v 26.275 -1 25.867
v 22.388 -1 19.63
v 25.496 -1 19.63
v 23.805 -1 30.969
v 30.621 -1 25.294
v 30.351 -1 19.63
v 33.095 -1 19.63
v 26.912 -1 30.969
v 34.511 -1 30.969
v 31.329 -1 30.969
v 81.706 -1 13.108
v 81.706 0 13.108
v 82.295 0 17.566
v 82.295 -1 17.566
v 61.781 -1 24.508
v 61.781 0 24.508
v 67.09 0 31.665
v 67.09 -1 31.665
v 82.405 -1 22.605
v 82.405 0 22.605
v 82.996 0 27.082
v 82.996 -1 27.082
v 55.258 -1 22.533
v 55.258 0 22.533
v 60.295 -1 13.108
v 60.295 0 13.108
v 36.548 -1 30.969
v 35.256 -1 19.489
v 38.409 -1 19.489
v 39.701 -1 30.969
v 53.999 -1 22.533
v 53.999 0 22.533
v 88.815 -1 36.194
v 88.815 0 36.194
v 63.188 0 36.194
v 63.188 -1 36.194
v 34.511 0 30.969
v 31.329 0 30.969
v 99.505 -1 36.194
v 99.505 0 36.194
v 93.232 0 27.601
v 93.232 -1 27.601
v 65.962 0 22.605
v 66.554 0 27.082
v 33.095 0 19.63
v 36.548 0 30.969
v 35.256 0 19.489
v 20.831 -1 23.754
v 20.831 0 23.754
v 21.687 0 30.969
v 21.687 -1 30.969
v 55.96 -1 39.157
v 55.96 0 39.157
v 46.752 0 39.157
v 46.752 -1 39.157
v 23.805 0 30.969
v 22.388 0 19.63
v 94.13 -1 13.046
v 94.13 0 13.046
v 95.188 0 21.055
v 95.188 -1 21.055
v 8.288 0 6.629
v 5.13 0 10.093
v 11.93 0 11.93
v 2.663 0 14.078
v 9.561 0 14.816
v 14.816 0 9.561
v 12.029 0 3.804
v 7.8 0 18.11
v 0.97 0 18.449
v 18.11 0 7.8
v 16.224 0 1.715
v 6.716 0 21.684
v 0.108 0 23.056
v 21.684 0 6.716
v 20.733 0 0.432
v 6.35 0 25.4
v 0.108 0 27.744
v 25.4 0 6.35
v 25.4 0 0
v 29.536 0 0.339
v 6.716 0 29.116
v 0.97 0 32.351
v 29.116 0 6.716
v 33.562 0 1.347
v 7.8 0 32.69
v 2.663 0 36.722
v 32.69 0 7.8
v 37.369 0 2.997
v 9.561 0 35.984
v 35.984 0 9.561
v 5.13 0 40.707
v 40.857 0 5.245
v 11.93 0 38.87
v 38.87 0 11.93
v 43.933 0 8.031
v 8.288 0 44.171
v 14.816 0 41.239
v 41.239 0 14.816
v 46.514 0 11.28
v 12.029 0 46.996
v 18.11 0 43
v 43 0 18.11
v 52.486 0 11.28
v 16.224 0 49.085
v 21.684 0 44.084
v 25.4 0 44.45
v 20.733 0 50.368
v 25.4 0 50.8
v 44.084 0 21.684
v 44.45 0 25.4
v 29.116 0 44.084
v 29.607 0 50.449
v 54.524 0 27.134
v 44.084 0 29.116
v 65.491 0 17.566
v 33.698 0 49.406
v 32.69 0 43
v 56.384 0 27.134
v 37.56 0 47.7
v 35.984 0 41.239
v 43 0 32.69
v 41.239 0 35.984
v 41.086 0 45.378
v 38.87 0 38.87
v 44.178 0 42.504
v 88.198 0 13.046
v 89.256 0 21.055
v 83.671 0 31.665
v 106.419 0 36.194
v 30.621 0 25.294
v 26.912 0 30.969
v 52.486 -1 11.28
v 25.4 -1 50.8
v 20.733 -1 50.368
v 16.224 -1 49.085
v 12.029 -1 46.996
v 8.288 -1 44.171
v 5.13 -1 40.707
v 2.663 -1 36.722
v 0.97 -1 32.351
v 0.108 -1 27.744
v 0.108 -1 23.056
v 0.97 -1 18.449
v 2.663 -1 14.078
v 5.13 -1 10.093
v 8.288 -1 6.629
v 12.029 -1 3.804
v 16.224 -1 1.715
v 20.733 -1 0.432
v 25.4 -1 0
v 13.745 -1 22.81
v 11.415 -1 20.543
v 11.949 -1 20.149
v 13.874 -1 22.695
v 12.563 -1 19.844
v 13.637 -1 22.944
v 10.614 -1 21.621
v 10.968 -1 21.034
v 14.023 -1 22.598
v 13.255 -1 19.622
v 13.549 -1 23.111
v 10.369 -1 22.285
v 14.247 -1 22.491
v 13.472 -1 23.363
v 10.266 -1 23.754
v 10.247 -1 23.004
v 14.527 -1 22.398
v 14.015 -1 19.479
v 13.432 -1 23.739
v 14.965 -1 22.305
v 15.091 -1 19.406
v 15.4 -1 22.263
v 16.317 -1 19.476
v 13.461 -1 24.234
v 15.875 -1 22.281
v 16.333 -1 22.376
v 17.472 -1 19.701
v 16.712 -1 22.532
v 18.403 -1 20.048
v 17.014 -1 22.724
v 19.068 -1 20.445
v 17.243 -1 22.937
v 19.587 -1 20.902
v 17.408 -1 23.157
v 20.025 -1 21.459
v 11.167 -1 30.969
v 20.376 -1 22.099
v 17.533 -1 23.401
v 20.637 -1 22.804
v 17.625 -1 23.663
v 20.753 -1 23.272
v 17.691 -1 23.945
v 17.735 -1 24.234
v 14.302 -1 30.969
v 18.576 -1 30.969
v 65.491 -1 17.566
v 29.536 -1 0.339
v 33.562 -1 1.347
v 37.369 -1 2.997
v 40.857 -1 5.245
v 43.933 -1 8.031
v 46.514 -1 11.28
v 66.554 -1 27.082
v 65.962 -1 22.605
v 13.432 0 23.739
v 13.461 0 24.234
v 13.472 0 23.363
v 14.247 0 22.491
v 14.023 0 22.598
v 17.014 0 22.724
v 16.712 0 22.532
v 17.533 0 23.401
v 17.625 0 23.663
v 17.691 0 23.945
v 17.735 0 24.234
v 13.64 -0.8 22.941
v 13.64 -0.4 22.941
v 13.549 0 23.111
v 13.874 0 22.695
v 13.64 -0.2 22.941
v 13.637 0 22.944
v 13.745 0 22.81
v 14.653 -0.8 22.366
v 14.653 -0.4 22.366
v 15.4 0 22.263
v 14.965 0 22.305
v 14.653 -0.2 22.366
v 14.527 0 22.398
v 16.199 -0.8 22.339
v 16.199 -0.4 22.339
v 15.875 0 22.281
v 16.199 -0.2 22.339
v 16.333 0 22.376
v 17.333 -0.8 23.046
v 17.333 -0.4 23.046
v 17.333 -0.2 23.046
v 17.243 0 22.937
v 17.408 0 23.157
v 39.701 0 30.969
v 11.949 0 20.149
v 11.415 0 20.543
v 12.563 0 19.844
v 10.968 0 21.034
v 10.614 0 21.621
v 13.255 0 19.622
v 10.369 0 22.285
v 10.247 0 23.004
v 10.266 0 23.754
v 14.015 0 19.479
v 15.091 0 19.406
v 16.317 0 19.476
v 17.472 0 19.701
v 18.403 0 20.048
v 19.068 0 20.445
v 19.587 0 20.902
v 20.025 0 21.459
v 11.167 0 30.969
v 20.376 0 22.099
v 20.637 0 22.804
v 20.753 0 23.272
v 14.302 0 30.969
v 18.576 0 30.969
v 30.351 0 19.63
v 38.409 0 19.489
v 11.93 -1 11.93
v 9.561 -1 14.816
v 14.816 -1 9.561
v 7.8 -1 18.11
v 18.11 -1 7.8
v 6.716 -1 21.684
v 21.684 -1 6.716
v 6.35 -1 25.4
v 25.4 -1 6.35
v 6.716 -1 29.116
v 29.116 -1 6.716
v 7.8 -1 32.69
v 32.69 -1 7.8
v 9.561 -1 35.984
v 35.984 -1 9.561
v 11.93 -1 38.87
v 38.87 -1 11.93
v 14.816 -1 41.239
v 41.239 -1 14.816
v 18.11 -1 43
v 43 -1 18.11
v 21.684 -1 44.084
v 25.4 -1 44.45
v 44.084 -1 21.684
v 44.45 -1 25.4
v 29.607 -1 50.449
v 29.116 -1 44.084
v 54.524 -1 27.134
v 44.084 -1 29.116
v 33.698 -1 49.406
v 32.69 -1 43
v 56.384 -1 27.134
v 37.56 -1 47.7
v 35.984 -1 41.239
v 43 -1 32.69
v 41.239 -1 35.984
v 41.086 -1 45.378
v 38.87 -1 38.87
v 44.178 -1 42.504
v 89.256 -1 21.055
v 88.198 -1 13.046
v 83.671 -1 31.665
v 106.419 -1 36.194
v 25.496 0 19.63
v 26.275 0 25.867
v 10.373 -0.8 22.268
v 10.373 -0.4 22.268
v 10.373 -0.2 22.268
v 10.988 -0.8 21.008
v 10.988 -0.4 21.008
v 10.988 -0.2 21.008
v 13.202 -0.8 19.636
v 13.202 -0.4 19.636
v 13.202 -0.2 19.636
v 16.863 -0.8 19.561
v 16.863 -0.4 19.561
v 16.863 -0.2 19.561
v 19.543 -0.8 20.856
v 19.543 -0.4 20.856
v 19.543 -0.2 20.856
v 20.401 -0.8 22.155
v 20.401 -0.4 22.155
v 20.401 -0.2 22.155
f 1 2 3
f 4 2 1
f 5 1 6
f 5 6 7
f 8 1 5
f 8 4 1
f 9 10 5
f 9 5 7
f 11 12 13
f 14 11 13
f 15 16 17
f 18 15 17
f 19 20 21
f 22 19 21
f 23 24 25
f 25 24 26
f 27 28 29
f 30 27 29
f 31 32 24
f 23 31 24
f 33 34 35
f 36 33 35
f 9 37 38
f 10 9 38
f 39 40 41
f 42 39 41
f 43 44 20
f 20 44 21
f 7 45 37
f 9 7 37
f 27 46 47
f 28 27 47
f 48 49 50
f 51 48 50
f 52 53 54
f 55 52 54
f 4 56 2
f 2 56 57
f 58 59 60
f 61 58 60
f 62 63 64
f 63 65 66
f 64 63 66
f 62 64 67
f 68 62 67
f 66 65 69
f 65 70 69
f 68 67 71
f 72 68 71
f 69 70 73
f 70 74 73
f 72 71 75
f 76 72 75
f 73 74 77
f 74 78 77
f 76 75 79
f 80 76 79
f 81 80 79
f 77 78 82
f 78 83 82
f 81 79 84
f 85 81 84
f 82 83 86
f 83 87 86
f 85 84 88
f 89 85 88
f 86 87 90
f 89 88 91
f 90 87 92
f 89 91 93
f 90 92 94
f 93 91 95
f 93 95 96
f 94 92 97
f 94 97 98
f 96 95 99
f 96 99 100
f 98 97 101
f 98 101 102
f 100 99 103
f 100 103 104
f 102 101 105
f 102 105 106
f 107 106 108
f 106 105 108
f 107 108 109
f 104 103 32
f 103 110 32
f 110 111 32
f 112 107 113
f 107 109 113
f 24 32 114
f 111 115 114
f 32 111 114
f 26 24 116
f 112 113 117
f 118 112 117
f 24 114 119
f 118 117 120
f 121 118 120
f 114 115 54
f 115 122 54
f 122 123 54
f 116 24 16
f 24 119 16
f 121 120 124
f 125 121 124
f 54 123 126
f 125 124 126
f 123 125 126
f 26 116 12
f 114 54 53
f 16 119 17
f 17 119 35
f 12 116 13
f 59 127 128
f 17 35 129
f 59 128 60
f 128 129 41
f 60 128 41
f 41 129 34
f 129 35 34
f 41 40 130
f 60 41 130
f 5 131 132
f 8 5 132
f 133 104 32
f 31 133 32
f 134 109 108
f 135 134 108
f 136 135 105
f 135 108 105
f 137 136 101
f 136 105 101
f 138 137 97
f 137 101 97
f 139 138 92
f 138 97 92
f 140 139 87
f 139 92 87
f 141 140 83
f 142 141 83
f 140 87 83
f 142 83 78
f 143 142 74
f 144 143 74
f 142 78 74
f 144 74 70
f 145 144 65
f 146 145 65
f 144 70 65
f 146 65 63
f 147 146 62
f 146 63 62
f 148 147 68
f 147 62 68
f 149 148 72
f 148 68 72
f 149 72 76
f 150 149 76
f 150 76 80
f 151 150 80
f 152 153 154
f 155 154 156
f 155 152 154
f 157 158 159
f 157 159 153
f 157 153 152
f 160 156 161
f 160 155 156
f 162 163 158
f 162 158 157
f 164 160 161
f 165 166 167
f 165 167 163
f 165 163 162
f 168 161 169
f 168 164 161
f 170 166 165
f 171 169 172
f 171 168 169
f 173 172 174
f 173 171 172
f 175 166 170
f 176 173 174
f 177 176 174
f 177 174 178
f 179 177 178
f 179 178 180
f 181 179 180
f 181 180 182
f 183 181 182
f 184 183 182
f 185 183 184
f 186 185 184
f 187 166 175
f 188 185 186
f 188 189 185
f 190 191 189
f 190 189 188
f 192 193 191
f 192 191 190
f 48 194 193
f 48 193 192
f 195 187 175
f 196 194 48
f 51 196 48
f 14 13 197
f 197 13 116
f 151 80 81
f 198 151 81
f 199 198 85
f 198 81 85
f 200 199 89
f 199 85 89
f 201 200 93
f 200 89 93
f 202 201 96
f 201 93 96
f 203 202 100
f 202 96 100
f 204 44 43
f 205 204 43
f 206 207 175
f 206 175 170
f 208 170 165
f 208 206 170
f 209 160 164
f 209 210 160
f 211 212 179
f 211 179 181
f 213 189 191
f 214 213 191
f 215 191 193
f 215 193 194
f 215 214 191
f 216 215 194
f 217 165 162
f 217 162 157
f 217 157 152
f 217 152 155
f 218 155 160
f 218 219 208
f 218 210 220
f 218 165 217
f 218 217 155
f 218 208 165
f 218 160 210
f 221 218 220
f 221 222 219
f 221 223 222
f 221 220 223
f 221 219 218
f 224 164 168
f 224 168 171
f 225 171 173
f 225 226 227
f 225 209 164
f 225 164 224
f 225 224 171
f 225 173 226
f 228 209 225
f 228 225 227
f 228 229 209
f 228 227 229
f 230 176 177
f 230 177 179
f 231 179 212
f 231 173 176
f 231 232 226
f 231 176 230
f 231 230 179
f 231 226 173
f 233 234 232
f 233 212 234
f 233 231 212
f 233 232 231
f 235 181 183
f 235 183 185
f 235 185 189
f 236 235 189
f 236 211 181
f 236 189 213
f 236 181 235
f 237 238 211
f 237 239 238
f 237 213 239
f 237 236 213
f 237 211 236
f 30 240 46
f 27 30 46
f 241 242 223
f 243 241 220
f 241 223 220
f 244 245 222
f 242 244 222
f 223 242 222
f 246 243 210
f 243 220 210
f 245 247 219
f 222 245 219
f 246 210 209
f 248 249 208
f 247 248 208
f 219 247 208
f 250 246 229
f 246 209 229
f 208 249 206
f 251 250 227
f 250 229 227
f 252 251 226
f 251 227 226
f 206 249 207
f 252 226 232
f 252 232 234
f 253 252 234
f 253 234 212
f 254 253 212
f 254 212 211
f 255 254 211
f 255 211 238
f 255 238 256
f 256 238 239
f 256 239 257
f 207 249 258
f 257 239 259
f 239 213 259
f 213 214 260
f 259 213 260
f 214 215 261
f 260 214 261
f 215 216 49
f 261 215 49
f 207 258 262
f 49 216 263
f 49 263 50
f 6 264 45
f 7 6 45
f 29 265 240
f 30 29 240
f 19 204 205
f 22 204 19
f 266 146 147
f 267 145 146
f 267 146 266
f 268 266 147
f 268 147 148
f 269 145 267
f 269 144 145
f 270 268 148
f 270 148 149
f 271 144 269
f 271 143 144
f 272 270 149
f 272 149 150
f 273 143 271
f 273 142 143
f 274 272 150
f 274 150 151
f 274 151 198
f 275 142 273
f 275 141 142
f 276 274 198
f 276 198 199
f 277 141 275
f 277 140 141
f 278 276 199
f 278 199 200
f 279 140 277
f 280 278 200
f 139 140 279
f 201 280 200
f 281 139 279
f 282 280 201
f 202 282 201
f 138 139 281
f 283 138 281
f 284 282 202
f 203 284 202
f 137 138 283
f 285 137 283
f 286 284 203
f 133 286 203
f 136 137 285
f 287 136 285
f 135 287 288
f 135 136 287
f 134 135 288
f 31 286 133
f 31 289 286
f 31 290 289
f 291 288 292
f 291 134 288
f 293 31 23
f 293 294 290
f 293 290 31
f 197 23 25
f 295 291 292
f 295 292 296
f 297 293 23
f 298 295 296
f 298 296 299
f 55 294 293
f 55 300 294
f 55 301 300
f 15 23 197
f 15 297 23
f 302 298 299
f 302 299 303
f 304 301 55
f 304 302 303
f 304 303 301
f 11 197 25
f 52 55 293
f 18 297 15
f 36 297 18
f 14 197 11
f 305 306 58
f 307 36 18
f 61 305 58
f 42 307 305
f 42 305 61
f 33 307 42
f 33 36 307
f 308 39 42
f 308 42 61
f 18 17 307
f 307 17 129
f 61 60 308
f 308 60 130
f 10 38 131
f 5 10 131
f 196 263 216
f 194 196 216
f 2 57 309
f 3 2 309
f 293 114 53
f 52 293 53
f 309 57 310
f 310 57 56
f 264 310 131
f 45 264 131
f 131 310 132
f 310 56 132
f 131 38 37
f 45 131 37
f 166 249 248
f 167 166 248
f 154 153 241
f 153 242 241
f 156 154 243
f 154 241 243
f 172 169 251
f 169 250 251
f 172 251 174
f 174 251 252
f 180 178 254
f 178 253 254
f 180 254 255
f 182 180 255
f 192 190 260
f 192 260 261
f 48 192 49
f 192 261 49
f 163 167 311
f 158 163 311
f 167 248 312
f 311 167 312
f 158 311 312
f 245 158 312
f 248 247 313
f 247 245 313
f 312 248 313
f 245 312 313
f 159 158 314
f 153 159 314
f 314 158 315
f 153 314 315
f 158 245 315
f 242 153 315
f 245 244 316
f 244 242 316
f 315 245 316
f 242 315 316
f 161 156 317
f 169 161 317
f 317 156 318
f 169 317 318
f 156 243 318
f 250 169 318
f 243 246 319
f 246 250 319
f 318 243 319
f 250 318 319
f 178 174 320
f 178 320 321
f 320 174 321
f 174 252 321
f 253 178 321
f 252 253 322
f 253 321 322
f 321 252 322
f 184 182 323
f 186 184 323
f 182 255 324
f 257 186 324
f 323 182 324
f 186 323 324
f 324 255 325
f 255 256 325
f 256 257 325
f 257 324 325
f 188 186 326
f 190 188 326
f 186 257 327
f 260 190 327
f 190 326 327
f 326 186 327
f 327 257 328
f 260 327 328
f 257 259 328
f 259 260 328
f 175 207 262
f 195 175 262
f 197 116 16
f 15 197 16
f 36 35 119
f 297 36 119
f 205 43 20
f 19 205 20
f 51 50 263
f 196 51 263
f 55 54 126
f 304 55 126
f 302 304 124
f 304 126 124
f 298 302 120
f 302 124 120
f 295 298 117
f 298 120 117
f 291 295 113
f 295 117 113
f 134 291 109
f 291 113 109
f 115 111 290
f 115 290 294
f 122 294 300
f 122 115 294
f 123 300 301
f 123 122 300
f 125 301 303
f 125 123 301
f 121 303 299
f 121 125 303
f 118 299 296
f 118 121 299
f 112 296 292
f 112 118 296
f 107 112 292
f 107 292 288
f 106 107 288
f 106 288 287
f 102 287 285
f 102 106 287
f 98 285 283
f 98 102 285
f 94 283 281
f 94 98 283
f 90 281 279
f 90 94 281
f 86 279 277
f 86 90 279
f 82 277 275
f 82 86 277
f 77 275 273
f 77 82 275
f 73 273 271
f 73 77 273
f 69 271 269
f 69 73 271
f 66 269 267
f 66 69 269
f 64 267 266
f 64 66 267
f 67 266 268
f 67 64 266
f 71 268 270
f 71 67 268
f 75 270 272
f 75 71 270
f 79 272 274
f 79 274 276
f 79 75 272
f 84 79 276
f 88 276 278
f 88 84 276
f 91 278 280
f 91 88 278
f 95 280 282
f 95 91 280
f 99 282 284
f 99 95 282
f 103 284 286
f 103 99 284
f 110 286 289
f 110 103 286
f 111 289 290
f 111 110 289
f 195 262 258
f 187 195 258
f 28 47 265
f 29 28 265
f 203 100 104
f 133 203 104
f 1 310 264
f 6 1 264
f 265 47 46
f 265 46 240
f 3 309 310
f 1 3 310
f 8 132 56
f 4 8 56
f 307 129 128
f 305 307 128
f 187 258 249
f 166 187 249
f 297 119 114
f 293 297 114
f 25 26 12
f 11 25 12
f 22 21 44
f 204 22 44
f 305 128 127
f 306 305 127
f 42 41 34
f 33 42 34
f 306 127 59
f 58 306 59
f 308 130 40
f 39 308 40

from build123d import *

# Parameters (mm, degrees)
F2_DEPTH = 1
F1_R     = 19.05


with BuildPart() as f2:
    # F1 (on Front) → F2 (new body)
    with BuildSketch(Plane.XZ):
        Polygon((82.9961871263, 27.0818155259), (66.5535926819, 27.0818155259), (65.9620339516, 22.6049686938), (82.404628396, 22.6049686938), align=None)
    extrude(amount=F2_DEPTH)


with BuildPart() as f2b:
    # F1 (on Front) → F2, piece 2 (new body)
    with BuildSketch(Plane.XZ):
        with BuildLine():
            ThreePointArc((46.7516648161, 39.1574128956), (49.7669067213, 32.5703456566), (50.8, 25.4))
            ThreePointArc((50.8, 25.4), (49.7048843477, 18.0221549998), (46.5139687522, 11.2804984674))
            Line((46.5139687522, 11.2804984674), (52.4864755571, 11.2804984674))
            Line((52.4864755571, 11.2804984674), (53.9994613201, 22.5333180279))
            Line((53.9994613201, 22.5333180279), (55.2576243713, 22.5333180279))
            Line((55.2576243713, 22.5333180279), (60.2951698917, 13.1082339212))
            Line((60.2951698917, 13.1082339212), (81.7060988754, 13.1082339212))
            Line((81.7060988754, 13.1082339212), (82.295195533, 17.5664480776))
            Line((82.295195533, 17.5664480776), (65.4909238219, 17.5664480776))
            Line((65.4909238219, 17.5664480776), (61.780732125, 24.5080962777))
            Line((61.780732125, 24.5080962777), (67.0903518244, 31.6653137458))
            Line((67.0903518244, 31.6653137458), (83.6714297758, 31.6653137458))
            Line((83.6714297758, 31.6653137458), (89.2562275008, 21.0553194691))
            Line((89.2562275008, 21.0553194691), (88.1979187112, 13.0461631343))
            Line((88.1979187112, 13.0461631343), (94.1299913311, 13.0461631343))
            Line((94.1299913311, 13.0461631343), (95.1883001206, 21.0553194691))
            Line((95.1883001206, 21.0553194691), (106.4187288825, 36.1936204135))
            Line((106.4187288825, 36.1936204135), (99.5046484973, 36.1936204135))
            Line((99.5046484973, 36.1936204135), (93.2316854596, 27.6011060923))
            Line((93.2316854596, 27.6011060923), (88.8152111079, 36.1936204135))
            Line((88.8152111079, 36.1936204135), (63.1883591413, 36.1936204135))
            Line((63.1883591413, 36.1936204135), (56.3835725188, 27.1342098713))
            Line((56.3835725188, 27.1342098713), (54.5240081847, 27.1342098713))
            Line((54.5240081847, 27.1342098713), (55.960258209, 39.1574128956))
            Line((55.960258209, 39.1574128956), (46.7516648161, 39.1574128956))
        make_face()
        with BuildLine():
            ThreePointArc((46.5139687522, 11.2804984674), (49.7048843477, 18.0221549998), (50.8, 25.4))
            ThreePointArc((50.8, 25.4), (49.7669067213, 32.5703456566), (46.7516648161, 39.1574128956))
            ThreePointArc((46.7516648161, 39.1574128956), (37.5598049419, 47.7002050164), (25.4, 50.8))
            ThreePointArc((25.4, 50.8), (0, 25.4), (25.4, 0))
            ThreePointArc((25.4, 0), (37.369224308, 2.9969272316), (46.5139687522, 11.2804984674))
        make_face()
        with Locations((25.4, 25.4)):
            Circle(F1_R, mode=Mode.SUBTRACT)
    extrude(amount=F2_DEPTH)


with BuildPart() as f2c:
    # F1 (on Front) → F2, piece 3 (new body)
    with BuildSketch(Plane.XZ):
        Polygon((23.8046244951, 30.968748033), (22.3884135485, 19.6296200156), (25.4960613407, 19.6296200156), (26.2750982098, 25.867108018), (30.3509384394, 19.6296200156), (33.0948494375, 19.6296200156), (34.5110603841, 30.968748033), (31.3294984272, 30.968748033), (30.6206891305, 25.2935487457), (26.9122722874, 30.968748033), align=None)
    extrude(amount=F2_DEPTH)


with BuildPart() as f2d:
    # F1 (on Front) → F2, piece 4 (new body)
    with BuildSketch(Plane.XZ):
        with BuildLine():
            Line((20.8305145293, 23.7536086845), (21.6873288155, 30.968748033))
            Line((21.6873288155, 30.968748033), (18.5763090849, 30.968748033))
            Line((18.5763090849, 30.968748033), (17.7352244653, 24.2344644173))
            add(Edge.make_bspline(
                [(13.4605423235, 24.2344644173), (13.4004651698, 23.7534467142), (13.442377269, 22.8075392295), (14.6638588286, 22.2768183453), (16.217162271, 22.1857318889), (17.4776914113, 22.9427442388), (17.6813921624, 23.803447148), (17.7352244653, 24.2344644173)],
                knots=[0, 0, 0, 0, 0.1990339161, 0.3870519636, 0.6036244782, 0.8049251901, 1, 1, 1, 1], degree=3))
            Line((13.4605423235, 24.2344644173), (14.3016269431, 30.968748033))
            Line((14.3016269431, 30.968748033), (11.1668603495, 30.968748033))
            Line((11.1668603495, 30.968748033), (10.2657188057, 23.7536086845))
            add(Edge.make_bspline(
                [(10.2657188057, 23.7536086845), (10.1380010349, 22.7310151535), (10.727591852, 20.7721022488), (13.1601639773, 19.3592225237), (16.9069217065, 19.3258496174), (19.8142521895, 20.5617271867), (20.6970567317, 22.6297751743), (20.8305145293, 23.7536086845)],
                knots=[0, 0, 0, 0, 0.1932762379, 0.3783953082, 0.597878443, 0.7957637049, 1, 1, 1, 1], degree=3))
        make_face()
    extrude(amount=F2_DEPTH)


with BuildPart() as f2e:
    # F1 (on Front) → F2, piece 5 (new body)
    with BuildSketch(Plane.XZ):
        Polygon((39.7005101856, 30.968748033), (36.5480764028, 30.968748033), (35.2561064065, 19.489273097), (38.4085401893, 19.489273097), align=None)
    extrude(amount=F2_DEPTH)


solid = Compound([f2.part, f2b.part, f2c.part, f2d.part, f2e.part])
